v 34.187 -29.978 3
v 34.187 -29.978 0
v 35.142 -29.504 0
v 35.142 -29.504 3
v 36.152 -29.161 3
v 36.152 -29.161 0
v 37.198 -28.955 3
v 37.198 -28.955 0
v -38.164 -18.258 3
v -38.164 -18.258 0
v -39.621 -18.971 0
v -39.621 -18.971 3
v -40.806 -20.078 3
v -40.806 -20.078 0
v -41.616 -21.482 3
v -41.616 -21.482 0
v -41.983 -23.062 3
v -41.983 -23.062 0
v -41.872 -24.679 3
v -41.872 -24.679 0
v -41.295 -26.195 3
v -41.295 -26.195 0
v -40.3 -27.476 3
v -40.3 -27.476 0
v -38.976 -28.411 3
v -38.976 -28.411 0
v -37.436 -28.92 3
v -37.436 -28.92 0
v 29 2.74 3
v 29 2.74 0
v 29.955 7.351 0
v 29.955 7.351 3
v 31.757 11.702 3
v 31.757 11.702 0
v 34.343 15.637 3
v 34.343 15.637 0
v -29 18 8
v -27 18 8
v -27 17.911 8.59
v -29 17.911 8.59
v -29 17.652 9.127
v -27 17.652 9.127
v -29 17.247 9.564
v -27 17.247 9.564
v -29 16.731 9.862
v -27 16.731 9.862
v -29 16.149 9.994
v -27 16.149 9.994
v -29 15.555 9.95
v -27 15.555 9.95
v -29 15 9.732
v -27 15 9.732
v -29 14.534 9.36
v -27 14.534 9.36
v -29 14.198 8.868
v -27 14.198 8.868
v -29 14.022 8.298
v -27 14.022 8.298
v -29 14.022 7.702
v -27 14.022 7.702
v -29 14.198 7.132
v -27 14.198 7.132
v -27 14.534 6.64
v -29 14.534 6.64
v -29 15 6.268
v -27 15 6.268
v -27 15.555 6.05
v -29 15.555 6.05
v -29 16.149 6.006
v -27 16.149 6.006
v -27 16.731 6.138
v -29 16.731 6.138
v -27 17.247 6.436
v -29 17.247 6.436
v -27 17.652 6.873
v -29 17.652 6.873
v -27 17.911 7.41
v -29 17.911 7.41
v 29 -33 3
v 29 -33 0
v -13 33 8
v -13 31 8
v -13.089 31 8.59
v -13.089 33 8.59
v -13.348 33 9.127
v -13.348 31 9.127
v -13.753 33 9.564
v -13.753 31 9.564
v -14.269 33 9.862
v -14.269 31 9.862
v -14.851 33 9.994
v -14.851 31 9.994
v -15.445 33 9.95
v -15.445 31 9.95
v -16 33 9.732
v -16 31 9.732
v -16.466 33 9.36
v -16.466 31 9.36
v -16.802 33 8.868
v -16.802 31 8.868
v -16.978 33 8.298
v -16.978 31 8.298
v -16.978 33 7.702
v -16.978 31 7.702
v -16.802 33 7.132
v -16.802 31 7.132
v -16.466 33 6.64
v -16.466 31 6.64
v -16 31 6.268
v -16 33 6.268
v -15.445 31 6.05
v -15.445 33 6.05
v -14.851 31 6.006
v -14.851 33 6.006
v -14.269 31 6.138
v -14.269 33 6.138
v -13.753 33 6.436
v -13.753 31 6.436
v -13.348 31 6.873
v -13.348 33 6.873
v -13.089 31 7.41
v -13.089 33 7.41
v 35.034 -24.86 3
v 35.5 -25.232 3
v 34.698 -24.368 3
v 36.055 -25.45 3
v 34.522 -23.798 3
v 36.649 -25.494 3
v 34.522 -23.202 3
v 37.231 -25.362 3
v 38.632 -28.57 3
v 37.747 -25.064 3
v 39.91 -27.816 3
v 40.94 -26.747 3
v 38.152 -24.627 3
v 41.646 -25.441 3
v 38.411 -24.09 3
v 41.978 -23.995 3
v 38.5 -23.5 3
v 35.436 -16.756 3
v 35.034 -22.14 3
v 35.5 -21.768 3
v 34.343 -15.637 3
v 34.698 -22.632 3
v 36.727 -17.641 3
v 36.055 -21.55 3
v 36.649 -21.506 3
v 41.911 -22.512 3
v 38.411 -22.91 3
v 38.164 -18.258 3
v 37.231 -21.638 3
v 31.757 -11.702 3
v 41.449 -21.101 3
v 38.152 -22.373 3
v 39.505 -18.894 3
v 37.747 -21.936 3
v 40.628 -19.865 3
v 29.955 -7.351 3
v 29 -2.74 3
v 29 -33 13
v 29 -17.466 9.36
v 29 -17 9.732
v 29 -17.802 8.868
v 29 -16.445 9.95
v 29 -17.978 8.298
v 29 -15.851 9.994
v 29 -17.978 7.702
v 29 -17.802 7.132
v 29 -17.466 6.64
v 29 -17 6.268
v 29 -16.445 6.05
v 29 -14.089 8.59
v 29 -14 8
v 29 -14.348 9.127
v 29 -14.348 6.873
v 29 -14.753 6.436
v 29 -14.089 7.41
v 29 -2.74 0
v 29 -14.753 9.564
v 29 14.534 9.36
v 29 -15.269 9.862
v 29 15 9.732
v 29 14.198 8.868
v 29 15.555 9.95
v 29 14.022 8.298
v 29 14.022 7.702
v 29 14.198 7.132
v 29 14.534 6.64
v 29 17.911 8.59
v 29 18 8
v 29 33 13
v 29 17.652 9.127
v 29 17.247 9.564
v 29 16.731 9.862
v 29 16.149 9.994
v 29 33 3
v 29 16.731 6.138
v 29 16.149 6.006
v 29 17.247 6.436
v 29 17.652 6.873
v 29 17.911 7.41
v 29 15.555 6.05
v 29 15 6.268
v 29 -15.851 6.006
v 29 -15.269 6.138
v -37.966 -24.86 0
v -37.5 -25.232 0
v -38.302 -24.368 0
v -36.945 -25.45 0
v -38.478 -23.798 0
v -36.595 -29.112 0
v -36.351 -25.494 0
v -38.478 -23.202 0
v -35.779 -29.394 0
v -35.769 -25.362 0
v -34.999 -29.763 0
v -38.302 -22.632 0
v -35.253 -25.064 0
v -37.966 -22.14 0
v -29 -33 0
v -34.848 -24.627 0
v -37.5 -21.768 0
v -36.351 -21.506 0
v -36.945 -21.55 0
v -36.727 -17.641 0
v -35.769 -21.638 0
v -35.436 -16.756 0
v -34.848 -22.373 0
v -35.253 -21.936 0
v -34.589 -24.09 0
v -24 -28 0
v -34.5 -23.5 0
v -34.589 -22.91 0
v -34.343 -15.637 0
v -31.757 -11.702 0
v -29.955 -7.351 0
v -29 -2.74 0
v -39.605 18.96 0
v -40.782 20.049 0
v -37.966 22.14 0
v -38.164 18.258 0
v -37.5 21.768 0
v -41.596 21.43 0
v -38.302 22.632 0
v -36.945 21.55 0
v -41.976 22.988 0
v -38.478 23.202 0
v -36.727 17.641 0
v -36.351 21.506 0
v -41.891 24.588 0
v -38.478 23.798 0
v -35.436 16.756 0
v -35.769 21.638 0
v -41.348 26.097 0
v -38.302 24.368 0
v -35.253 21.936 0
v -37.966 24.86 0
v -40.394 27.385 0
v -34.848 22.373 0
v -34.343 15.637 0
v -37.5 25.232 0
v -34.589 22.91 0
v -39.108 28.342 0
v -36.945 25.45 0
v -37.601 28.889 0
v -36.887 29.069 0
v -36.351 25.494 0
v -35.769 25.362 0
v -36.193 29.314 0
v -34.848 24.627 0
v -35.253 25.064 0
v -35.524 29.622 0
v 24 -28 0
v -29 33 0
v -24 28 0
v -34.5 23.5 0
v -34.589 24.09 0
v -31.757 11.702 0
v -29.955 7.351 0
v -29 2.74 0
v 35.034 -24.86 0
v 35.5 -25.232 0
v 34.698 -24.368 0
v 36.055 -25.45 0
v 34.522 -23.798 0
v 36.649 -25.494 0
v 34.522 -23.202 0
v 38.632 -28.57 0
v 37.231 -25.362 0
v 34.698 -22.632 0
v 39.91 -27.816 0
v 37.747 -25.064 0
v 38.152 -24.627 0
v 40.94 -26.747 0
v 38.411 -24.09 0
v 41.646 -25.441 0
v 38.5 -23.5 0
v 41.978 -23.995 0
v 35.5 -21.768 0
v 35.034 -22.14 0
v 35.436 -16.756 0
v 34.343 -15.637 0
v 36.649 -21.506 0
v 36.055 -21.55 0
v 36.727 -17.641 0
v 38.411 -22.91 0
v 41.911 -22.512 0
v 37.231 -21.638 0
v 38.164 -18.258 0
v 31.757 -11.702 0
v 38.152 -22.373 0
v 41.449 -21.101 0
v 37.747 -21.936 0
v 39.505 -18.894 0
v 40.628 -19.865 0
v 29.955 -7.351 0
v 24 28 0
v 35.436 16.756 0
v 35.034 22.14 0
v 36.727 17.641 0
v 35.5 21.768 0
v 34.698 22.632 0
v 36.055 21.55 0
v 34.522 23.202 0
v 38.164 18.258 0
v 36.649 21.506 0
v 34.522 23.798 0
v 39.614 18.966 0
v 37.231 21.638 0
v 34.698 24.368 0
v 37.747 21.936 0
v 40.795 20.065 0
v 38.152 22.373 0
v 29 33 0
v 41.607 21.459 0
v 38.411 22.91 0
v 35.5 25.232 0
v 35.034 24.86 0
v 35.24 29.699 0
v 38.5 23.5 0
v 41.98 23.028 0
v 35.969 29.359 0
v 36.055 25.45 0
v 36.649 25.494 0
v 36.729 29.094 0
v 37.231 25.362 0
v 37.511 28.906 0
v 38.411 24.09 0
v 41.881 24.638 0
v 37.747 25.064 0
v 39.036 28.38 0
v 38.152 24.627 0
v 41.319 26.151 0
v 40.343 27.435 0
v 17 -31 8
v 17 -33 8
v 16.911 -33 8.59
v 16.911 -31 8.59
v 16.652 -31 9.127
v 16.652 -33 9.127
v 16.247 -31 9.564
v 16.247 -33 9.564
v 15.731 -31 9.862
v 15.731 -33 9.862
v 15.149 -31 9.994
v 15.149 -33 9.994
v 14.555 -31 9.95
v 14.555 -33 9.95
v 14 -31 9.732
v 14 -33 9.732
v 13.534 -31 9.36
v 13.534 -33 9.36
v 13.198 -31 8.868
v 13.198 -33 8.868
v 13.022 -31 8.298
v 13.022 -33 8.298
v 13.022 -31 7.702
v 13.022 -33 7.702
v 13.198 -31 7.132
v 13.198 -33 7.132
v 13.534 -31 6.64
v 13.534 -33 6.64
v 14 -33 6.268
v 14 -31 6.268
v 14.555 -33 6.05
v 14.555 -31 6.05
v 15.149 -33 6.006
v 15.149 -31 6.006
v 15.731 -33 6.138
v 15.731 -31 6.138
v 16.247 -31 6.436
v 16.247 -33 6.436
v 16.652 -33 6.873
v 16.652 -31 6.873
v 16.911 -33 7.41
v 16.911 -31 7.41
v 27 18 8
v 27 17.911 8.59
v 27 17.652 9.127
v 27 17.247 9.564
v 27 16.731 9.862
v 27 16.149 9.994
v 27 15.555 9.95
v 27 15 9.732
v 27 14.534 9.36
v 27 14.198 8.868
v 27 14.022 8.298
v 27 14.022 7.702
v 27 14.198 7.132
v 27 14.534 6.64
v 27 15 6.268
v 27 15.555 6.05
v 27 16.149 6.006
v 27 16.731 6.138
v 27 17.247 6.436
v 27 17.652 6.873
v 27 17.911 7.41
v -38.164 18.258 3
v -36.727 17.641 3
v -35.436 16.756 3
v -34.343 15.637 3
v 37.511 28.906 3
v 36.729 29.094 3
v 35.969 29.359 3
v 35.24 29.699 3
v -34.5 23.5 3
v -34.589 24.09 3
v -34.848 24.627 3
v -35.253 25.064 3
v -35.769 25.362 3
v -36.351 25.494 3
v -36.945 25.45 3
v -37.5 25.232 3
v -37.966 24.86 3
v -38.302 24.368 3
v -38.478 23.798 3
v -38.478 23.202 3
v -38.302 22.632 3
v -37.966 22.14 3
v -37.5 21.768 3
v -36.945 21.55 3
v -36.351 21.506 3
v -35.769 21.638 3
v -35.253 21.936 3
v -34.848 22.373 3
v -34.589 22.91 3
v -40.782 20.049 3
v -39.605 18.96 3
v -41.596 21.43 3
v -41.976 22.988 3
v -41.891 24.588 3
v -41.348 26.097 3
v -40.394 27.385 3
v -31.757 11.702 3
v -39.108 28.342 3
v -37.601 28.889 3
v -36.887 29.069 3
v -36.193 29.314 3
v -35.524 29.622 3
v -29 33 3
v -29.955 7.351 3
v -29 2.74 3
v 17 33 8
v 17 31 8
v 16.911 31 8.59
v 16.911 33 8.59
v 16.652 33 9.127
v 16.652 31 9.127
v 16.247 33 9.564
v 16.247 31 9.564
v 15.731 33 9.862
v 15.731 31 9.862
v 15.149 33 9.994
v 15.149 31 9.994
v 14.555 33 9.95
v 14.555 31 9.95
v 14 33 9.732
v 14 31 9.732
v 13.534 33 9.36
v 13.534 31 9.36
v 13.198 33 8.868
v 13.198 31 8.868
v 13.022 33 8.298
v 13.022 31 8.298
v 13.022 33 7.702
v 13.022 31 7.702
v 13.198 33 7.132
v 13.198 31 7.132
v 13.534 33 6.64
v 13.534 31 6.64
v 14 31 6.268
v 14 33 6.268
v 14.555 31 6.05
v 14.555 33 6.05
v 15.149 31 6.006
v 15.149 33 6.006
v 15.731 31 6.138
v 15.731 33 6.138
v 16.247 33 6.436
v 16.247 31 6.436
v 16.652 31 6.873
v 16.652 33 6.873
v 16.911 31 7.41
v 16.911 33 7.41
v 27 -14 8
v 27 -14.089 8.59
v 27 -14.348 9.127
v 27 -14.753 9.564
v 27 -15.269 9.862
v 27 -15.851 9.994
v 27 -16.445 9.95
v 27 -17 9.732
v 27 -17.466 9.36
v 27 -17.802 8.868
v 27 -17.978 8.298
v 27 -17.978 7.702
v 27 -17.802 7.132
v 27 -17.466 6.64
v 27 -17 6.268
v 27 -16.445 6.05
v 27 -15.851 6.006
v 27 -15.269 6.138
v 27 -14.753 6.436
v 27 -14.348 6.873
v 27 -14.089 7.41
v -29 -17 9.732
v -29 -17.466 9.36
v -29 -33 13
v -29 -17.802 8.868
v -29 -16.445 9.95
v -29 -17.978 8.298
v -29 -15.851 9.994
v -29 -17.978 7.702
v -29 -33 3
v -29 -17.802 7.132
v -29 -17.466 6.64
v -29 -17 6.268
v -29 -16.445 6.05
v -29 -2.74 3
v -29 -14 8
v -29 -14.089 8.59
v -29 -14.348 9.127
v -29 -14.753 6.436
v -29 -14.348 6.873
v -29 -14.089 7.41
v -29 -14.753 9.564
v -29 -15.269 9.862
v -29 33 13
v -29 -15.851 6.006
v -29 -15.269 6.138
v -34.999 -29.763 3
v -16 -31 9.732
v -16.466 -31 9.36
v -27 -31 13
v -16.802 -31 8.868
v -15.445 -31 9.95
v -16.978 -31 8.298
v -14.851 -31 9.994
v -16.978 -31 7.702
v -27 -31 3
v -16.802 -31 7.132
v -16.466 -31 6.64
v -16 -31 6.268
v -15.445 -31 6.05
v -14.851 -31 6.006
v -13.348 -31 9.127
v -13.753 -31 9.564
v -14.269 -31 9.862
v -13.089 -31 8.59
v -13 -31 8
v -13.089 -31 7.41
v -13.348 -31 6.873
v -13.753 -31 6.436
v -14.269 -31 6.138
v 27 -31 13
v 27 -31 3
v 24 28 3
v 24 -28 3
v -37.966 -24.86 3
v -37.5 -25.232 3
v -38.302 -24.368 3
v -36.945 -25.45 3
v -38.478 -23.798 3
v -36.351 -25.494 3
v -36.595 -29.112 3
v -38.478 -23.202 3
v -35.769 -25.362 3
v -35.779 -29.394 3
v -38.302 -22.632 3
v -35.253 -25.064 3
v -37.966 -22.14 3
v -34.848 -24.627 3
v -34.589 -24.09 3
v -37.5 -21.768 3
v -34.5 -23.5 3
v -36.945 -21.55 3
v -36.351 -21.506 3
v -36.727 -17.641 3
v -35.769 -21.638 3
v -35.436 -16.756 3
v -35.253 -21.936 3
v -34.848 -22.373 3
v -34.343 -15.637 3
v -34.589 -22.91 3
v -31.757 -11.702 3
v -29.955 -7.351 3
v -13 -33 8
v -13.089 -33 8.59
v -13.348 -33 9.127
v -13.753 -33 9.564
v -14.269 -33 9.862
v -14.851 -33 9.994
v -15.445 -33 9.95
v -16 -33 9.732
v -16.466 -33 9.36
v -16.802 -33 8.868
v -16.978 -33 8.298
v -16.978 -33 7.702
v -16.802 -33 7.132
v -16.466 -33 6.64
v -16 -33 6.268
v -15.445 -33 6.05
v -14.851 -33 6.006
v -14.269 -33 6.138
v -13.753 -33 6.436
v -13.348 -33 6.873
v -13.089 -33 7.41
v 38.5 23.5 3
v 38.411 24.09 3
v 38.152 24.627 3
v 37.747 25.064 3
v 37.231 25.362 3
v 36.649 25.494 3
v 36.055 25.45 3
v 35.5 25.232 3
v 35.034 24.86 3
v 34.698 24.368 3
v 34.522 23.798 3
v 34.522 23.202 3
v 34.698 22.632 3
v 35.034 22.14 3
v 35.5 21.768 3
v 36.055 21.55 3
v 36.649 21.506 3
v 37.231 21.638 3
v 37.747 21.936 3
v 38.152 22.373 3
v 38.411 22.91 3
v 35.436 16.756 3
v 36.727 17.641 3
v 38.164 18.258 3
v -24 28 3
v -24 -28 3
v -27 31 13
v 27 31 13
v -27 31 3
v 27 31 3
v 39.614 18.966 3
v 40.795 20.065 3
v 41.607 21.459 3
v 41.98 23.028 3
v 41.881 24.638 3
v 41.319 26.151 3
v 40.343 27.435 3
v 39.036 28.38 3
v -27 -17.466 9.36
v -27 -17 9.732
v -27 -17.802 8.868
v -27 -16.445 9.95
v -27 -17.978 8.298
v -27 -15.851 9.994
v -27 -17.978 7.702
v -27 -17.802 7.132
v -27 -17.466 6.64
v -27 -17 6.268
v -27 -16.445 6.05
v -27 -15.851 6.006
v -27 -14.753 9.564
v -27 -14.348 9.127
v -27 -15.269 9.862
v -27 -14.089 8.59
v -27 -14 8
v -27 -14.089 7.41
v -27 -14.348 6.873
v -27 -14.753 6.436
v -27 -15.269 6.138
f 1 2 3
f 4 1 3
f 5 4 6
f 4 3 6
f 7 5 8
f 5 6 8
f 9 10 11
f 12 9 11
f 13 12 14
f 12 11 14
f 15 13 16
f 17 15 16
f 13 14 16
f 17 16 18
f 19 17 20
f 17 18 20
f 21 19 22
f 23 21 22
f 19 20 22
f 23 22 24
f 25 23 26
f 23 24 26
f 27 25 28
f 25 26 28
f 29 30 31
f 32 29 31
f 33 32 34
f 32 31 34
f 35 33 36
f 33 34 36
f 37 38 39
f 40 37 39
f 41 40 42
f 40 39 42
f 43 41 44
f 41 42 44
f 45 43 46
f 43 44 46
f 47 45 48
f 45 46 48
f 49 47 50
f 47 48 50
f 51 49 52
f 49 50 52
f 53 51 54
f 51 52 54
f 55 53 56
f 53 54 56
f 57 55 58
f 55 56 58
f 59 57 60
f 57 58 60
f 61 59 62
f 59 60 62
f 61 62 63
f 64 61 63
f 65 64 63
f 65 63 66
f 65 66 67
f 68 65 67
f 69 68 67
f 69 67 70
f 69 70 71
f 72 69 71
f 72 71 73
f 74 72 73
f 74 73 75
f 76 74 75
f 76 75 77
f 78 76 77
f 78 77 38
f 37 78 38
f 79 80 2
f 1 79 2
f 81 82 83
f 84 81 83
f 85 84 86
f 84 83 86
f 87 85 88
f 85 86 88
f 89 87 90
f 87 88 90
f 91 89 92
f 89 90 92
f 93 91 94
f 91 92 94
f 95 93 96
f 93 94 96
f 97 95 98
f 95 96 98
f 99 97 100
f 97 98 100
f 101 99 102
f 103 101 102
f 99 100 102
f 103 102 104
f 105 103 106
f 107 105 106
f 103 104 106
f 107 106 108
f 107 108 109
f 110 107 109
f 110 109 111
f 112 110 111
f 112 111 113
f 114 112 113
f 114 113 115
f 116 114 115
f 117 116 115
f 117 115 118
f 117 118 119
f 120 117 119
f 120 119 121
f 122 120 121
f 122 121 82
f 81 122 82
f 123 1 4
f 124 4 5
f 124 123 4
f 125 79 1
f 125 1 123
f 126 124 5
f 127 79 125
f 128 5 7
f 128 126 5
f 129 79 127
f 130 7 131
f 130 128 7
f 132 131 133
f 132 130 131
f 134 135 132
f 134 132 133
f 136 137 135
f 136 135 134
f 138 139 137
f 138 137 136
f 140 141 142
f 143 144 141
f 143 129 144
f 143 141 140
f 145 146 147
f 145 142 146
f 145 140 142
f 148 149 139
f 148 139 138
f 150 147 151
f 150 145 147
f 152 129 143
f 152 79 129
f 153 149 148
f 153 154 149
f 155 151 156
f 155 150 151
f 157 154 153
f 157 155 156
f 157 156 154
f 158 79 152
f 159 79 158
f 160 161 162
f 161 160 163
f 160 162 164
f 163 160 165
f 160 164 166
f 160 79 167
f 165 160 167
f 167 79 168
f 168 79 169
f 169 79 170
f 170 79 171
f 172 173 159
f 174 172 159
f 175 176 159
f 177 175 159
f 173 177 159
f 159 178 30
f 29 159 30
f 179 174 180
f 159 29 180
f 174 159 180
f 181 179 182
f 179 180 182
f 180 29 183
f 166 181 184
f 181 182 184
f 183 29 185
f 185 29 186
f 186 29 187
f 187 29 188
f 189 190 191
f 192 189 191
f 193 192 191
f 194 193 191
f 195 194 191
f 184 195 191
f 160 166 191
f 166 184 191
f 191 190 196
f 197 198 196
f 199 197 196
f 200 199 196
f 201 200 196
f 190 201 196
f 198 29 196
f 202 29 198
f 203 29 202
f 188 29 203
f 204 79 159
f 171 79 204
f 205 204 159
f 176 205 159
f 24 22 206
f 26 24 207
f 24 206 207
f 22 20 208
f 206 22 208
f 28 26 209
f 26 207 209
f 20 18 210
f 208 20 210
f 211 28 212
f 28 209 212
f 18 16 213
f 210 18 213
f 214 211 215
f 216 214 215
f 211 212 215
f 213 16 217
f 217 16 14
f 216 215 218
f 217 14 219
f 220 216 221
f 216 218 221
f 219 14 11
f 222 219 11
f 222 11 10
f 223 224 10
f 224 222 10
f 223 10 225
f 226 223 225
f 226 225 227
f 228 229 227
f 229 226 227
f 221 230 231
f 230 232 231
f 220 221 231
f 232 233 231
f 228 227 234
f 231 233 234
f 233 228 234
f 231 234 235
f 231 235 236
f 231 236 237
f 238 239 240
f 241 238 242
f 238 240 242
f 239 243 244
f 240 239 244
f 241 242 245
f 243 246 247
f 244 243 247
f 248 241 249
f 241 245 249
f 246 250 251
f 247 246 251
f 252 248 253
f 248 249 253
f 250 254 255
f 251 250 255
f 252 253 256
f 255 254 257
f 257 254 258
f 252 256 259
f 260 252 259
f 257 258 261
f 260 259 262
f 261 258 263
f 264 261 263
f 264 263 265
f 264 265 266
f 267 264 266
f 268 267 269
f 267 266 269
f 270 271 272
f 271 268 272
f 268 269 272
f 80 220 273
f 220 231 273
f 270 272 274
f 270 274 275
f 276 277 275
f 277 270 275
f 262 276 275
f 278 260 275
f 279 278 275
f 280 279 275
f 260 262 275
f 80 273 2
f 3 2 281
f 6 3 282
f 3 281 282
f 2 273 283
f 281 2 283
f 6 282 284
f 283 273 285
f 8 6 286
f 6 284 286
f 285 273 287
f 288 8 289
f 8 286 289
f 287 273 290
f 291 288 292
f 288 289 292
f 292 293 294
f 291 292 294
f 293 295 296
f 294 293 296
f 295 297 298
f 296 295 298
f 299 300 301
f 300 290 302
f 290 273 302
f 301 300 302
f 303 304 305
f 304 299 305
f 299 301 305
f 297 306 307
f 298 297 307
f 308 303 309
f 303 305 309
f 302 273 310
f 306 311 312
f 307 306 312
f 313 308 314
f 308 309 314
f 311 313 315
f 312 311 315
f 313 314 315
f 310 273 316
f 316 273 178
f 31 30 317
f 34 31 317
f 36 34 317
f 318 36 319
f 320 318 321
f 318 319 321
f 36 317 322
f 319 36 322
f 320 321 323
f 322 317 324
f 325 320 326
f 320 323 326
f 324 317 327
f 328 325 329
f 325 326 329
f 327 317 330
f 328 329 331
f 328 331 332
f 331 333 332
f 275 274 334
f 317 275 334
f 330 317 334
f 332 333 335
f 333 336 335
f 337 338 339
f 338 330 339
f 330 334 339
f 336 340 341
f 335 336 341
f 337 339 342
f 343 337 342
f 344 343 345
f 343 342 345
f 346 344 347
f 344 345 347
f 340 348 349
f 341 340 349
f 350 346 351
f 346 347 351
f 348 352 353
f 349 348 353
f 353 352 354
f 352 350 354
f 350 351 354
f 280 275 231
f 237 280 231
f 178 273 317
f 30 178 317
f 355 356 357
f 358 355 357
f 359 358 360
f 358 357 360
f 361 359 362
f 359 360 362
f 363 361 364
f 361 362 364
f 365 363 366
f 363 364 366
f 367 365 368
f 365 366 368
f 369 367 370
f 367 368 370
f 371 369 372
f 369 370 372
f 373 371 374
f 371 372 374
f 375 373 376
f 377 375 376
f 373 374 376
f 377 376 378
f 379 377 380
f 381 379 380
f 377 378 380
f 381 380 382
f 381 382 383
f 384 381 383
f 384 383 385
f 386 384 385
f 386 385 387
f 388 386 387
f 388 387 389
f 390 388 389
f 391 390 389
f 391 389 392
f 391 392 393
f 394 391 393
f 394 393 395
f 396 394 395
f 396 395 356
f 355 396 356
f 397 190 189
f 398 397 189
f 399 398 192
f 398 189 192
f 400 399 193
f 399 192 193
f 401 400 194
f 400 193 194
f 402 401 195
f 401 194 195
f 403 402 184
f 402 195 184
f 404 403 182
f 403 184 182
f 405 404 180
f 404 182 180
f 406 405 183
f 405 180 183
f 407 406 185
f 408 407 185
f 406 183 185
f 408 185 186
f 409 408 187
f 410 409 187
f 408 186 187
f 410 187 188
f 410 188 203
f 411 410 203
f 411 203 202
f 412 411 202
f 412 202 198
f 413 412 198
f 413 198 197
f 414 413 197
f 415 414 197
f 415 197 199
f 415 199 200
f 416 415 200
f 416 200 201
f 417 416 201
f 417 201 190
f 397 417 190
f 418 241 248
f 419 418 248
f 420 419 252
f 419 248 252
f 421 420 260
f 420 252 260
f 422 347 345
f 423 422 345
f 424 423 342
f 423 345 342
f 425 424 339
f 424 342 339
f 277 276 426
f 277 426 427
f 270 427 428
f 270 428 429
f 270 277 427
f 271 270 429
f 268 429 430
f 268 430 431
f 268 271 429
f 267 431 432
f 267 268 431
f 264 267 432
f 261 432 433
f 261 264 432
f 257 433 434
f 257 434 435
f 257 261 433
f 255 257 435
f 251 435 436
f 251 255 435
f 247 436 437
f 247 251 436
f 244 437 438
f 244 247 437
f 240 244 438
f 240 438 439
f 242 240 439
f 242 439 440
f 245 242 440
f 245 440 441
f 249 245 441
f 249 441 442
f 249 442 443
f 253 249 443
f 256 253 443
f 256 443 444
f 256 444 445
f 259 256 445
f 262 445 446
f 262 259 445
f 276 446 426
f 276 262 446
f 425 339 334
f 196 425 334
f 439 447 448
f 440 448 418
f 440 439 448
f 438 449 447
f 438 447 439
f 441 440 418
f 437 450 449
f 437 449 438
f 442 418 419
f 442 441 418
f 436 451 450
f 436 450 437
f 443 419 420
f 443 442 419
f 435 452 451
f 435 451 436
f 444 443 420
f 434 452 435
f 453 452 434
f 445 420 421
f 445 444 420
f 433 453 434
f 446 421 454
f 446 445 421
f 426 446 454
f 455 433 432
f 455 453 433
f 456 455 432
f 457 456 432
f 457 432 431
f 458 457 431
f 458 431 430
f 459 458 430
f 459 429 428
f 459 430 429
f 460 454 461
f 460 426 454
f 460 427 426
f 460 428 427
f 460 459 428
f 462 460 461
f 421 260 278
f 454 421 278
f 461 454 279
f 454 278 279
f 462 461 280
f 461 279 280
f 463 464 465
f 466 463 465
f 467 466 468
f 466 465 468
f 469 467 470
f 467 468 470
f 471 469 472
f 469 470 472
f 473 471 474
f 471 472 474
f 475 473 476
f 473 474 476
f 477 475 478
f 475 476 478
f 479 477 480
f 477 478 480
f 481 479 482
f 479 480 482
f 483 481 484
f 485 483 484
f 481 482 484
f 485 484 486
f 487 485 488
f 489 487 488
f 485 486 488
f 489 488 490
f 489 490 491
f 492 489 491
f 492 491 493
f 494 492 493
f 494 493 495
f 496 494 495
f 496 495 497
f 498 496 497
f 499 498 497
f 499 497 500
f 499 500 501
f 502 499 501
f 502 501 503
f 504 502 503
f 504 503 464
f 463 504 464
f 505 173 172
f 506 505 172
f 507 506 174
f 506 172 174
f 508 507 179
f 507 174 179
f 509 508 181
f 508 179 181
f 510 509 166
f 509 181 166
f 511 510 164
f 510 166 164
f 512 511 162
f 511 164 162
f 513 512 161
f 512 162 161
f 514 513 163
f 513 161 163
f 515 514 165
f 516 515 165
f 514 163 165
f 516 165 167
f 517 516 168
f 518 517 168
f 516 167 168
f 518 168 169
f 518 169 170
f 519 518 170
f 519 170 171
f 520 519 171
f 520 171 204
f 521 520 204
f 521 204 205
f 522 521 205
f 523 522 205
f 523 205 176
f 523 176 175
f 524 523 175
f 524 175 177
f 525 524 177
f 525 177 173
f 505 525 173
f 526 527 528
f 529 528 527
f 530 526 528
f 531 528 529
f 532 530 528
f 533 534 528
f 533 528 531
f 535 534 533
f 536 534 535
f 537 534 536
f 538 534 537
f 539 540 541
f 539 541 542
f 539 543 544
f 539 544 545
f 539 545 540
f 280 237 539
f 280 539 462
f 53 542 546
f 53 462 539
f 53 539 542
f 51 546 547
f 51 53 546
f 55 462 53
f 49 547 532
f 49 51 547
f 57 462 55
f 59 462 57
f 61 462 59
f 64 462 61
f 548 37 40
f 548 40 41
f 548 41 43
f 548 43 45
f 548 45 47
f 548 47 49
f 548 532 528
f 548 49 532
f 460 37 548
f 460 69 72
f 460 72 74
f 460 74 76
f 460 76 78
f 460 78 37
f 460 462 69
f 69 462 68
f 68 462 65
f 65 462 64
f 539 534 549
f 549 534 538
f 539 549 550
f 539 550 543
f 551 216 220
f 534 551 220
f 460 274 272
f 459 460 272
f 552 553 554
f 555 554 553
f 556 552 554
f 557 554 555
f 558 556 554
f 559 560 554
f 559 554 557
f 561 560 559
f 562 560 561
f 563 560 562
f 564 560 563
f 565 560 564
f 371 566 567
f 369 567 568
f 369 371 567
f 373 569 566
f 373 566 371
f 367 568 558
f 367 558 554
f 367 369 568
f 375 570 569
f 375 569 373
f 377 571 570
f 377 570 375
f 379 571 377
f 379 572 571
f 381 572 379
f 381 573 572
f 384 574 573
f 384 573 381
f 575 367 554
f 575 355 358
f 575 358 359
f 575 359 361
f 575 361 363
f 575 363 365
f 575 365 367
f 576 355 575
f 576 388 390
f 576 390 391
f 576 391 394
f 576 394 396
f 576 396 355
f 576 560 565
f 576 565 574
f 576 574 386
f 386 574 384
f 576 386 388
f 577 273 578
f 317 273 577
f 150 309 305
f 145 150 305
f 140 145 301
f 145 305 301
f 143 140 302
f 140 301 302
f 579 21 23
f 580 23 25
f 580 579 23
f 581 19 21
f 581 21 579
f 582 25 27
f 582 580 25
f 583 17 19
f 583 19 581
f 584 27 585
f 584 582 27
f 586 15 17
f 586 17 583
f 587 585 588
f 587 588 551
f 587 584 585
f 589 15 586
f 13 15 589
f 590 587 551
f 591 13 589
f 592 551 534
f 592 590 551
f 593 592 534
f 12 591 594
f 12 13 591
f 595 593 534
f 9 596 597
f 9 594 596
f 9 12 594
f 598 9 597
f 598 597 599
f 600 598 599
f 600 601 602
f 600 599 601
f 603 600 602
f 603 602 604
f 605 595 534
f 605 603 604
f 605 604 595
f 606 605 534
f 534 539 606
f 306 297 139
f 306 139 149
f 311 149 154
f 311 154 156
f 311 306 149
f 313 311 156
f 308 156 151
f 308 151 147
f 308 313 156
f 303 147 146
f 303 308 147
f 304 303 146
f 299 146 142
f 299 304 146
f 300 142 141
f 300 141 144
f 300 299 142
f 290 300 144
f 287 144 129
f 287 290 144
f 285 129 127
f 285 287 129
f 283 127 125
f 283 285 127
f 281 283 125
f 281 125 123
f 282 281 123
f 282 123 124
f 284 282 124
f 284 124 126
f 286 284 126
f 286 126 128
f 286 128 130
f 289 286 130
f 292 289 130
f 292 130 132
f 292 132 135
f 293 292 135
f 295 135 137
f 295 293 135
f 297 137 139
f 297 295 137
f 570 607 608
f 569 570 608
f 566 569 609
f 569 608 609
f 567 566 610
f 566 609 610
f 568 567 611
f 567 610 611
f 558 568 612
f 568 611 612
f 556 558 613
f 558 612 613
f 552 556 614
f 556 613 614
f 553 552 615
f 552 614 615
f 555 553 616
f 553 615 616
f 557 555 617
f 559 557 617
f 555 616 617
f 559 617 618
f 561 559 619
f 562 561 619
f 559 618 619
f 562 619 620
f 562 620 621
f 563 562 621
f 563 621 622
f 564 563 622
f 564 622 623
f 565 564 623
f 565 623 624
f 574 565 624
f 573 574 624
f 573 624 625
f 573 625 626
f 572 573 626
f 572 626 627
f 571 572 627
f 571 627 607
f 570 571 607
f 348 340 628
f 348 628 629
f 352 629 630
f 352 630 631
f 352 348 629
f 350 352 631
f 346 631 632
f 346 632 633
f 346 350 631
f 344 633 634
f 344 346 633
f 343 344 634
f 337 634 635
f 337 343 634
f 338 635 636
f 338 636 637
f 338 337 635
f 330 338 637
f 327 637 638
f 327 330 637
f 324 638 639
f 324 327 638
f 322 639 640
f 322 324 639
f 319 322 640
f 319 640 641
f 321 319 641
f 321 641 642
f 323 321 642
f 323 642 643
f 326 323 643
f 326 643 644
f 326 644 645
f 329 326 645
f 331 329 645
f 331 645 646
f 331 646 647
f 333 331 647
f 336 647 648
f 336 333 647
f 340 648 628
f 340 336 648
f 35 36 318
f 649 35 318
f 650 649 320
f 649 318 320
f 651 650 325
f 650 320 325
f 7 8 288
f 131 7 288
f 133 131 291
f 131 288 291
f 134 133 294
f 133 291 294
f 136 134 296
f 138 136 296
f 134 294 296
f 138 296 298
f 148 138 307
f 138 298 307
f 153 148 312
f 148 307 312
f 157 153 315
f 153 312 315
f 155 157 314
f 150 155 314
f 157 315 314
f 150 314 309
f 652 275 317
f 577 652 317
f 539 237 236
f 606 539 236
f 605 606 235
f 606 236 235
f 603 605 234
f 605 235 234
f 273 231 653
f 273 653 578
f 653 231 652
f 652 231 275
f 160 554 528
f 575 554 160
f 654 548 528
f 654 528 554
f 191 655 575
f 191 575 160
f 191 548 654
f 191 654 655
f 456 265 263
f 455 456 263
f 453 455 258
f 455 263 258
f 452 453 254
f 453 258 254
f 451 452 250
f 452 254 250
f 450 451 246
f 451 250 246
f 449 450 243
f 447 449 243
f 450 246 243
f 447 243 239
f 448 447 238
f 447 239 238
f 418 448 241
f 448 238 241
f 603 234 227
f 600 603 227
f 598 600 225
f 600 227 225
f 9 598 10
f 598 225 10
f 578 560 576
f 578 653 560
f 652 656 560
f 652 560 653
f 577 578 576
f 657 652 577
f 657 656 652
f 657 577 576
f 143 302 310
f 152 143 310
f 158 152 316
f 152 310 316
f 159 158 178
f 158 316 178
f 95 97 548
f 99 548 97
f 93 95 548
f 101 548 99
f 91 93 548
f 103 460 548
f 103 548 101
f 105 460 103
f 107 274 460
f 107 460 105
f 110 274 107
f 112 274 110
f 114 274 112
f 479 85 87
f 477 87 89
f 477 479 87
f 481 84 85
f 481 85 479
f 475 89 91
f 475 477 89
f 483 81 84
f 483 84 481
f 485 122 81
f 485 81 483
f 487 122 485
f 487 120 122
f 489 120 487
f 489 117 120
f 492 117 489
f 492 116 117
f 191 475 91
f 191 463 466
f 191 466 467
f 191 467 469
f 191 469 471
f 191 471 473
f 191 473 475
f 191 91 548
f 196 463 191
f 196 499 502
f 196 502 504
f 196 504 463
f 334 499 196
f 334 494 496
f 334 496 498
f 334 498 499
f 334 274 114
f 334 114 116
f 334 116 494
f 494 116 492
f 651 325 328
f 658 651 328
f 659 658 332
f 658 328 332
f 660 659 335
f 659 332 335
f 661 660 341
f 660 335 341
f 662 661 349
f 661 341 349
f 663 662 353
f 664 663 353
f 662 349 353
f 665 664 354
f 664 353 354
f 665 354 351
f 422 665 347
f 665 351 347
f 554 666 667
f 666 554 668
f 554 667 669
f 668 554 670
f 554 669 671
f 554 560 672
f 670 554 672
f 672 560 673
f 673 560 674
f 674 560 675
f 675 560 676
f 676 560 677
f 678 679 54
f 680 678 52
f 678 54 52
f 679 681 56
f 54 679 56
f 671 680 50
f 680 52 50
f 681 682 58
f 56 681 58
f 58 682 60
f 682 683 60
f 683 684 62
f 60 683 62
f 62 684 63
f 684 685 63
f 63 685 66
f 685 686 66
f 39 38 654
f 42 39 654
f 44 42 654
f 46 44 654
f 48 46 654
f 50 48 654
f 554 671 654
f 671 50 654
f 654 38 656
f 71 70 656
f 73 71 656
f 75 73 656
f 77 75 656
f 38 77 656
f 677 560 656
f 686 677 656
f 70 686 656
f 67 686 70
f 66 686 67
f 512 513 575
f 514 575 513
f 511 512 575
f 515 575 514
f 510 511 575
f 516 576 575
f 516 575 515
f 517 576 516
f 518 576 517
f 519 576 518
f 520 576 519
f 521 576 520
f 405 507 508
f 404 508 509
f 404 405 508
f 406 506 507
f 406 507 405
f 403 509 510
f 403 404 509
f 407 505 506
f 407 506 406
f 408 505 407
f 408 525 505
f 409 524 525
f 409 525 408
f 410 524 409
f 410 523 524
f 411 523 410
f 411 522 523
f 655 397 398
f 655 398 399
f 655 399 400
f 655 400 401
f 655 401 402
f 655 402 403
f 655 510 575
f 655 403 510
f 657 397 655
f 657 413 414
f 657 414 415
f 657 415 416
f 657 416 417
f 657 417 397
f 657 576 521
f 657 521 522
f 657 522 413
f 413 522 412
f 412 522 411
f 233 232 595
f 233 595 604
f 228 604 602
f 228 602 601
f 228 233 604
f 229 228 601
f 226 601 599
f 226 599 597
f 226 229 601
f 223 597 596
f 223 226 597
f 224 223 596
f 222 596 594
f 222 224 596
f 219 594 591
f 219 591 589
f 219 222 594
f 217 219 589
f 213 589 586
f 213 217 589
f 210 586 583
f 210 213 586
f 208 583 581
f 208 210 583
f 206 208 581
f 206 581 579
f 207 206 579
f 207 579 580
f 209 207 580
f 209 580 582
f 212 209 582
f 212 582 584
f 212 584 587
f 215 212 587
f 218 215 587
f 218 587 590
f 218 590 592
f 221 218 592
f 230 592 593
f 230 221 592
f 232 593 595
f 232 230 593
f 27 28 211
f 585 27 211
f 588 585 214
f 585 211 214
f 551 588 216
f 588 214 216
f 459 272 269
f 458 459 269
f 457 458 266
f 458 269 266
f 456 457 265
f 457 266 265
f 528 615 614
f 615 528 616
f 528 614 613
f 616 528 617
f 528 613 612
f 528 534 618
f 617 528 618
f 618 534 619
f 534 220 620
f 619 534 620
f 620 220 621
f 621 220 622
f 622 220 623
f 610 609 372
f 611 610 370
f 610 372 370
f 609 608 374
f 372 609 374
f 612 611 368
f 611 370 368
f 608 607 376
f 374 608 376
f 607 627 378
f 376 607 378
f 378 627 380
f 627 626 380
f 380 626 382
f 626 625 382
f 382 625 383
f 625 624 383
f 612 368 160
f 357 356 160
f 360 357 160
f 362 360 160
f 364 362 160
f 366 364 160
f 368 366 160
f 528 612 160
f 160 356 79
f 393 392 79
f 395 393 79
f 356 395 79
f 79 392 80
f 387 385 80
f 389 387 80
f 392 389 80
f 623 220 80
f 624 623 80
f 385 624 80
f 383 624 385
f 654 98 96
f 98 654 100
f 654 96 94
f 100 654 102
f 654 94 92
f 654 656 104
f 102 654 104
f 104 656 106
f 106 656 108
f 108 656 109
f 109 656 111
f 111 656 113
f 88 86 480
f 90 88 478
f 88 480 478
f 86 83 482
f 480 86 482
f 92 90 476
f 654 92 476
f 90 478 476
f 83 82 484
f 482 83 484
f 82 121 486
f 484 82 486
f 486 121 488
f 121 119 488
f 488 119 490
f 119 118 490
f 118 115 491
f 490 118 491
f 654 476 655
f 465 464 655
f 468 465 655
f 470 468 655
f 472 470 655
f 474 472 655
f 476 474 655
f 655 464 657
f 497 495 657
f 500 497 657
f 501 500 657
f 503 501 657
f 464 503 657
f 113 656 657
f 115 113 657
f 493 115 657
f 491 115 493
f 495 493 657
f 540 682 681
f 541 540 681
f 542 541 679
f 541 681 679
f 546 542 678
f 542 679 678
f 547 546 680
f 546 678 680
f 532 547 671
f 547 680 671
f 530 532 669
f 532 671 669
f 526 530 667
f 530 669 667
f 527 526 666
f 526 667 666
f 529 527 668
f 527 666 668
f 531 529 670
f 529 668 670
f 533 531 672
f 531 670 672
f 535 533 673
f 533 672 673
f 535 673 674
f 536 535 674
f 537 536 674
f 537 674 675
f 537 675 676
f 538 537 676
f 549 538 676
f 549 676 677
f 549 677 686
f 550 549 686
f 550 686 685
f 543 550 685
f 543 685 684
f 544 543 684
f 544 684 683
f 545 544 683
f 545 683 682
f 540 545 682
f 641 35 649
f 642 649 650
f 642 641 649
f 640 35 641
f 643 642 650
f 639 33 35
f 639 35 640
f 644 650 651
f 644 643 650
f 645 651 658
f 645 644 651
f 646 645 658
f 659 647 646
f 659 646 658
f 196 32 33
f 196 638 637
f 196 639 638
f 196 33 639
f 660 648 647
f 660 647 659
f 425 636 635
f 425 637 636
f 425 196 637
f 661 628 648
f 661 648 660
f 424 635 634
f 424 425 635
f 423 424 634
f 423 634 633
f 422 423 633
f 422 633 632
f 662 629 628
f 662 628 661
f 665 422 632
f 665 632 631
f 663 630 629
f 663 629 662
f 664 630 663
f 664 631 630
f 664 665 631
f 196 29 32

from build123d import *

# Parameters (mm, degrees)
F0_R     = 2
F0_W     = 48
F0_H     = 56
F1_DEPTH = 3
F2_W     = 58
F2_H     = 66
F2_W_2   = 54
F2_H_2   = 62
F3_DEPTH = 10
F4_R     = 2
F5_DEPTH = 150
F6_R     = 2
F7_DEPTH = 150


with BuildPart() as f1:
    # F0 (on Top) → F1 (new body)
    with BuildSketch(Plane.XY):
        with BuildLine():
            Line((-29, -33), (29, -33))
            Line((29, -33), (34.187102, -29.978189))
            ThreePointArc((34.187102, -29.978189), (35.641388, -29.315702), (37.198334, -28.955486))
            ThreePointArc((37.198334, -28.955486), (41.977715, -23.994613), (38.164283, -18.257848))
            ThreePointArc((38.164283, -18.257848), (36.059717, -17.229965), (34.343039, -15.636616))
            ThreePointArc((34.343039, -15.636616), (30.753152, -9.568991), (29, -2.740388))
            ThreePointArc((29, -2.740388), (28.849352, 0), (29, 2.740388))
            ThreePointArc((29, 2.740388), (30.753152, 9.568991), (34.343039, 15.636616))
            ThreePointArc((34.343039, 15.636616), (36.059717, 17.229965), (38.164283, 18.257848))
            ThreePointArc((38.164283, 18.257848), (41.989676, 23.836841), (37.510905, 28.906299))
            ThreePointArc((37.510905, 28.906299), (36.345626, 29.216653), (35.240235, 29.698633))
            Line((35.240235, 29.698633), (29, 33))
            Line((29, 33), (-29, 33))
            Line((-29, 33), (-35.523929, 29.622473))
            ThreePointArc((-35.523929, 29.622473), (-36.536989, 29.183773), (-37.600798, 28.888714))
            ThreePointArc((-37.600798, 28.888714), (-41.99229, 23.791117), (-38.164283, 18.257848))
            ThreePointArc((-38.164283, 18.257848), (-36.059717, 17.229965), (-34.343039, 15.636616))
            ThreePointArc((-34.343039, 15.636616), (-30.753152, 9.568991), (-29, 2.740388))
            ThreePointArc((-29, 2.740388), (-28.849352, 0), (-29, -2.740388))
            ThreePointArc((-29, -2.740388), (-30.753152, -9.568991), (-34.343039, -15.636616))
            ThreePointArc((-34.343039, -15.636616), (-36.059717, -17.229965), (-38.164283, -18.257848))
            ThreePointArc((-38.164283, -18.257848), (-41.987222, -23.874692), (-37.436242, -28.919728))
            ThreePointArc((-37.436242, -28.919728), (-36.183275, -29.24235), (-34.998701, -29.76273))
            Line((-34.998701, -29.76273), (-29, -33))
        make_face()
        with Locations((-36.5, -23.5)):
            Circle(F0_R, mode=Mode.SUBTRACT)
        with Locations((36.5, -23.5)):
            Circle(F0_R, mode=Mode.SUBTRACT)
        with Locations((-36.5, 23.5)):
            Circle(F0_R, mode=Mode.SUBTRACT)
        Rectangle(F0_W, F0_H, mode=Mode.SUBTRACT)
        with Locations((36.5, 23.5)):
            Circle(F0_R, mode=Mode.SUBTRACT)
        with BuildLine():
            ThreePointArc((29, 2.740388), (28.849352, 0), (29, -2.740388))
            Line((29, -2.740388), (29, 2.740388))
        make_face()
        with BuildLine():
            Line((-29, 2.740388), (-29, -2.740388))
            ThreePointArc((-29, -2.740388), (-28.849352, 0), (-29, 2.740388))
        make_face()
    extrude(amount=F1_DEPTH)

    # F2 (on face) → F3 (join)
    with BuildSketch(Plane.XY.offset(3)):
        Rectangle(F2_W, F2_H)
        Rectangle(F2_W_2, F2_H_2, mode=Mode.SUBTRACT)
    extrude(amount=F3_DEPTH)

    # F4 (on face) → F5 (cut)
    with BuildSketch(Plane.XZ.offset(33)):
        with Locations((-15, 8)):
            Circle(F4_R)
        with Locations((15, 8)):
            Circle(F4_R)
    extrude(amount=-F5_DEPTH, mode=Mode.SUBTRACT)

    # F6 (on face) → F7 (cut)
    with BuildSketch(Plane.YZ.offset(29)):
        with Locations((-16, 8)):
            Circle(F6_R)
        with Locations((16, 8)):
            Circle(F6_R)
    extrude(amount=-F7_DEPTH, mode=Mode.SUBTRACT)


solid = f1.part
